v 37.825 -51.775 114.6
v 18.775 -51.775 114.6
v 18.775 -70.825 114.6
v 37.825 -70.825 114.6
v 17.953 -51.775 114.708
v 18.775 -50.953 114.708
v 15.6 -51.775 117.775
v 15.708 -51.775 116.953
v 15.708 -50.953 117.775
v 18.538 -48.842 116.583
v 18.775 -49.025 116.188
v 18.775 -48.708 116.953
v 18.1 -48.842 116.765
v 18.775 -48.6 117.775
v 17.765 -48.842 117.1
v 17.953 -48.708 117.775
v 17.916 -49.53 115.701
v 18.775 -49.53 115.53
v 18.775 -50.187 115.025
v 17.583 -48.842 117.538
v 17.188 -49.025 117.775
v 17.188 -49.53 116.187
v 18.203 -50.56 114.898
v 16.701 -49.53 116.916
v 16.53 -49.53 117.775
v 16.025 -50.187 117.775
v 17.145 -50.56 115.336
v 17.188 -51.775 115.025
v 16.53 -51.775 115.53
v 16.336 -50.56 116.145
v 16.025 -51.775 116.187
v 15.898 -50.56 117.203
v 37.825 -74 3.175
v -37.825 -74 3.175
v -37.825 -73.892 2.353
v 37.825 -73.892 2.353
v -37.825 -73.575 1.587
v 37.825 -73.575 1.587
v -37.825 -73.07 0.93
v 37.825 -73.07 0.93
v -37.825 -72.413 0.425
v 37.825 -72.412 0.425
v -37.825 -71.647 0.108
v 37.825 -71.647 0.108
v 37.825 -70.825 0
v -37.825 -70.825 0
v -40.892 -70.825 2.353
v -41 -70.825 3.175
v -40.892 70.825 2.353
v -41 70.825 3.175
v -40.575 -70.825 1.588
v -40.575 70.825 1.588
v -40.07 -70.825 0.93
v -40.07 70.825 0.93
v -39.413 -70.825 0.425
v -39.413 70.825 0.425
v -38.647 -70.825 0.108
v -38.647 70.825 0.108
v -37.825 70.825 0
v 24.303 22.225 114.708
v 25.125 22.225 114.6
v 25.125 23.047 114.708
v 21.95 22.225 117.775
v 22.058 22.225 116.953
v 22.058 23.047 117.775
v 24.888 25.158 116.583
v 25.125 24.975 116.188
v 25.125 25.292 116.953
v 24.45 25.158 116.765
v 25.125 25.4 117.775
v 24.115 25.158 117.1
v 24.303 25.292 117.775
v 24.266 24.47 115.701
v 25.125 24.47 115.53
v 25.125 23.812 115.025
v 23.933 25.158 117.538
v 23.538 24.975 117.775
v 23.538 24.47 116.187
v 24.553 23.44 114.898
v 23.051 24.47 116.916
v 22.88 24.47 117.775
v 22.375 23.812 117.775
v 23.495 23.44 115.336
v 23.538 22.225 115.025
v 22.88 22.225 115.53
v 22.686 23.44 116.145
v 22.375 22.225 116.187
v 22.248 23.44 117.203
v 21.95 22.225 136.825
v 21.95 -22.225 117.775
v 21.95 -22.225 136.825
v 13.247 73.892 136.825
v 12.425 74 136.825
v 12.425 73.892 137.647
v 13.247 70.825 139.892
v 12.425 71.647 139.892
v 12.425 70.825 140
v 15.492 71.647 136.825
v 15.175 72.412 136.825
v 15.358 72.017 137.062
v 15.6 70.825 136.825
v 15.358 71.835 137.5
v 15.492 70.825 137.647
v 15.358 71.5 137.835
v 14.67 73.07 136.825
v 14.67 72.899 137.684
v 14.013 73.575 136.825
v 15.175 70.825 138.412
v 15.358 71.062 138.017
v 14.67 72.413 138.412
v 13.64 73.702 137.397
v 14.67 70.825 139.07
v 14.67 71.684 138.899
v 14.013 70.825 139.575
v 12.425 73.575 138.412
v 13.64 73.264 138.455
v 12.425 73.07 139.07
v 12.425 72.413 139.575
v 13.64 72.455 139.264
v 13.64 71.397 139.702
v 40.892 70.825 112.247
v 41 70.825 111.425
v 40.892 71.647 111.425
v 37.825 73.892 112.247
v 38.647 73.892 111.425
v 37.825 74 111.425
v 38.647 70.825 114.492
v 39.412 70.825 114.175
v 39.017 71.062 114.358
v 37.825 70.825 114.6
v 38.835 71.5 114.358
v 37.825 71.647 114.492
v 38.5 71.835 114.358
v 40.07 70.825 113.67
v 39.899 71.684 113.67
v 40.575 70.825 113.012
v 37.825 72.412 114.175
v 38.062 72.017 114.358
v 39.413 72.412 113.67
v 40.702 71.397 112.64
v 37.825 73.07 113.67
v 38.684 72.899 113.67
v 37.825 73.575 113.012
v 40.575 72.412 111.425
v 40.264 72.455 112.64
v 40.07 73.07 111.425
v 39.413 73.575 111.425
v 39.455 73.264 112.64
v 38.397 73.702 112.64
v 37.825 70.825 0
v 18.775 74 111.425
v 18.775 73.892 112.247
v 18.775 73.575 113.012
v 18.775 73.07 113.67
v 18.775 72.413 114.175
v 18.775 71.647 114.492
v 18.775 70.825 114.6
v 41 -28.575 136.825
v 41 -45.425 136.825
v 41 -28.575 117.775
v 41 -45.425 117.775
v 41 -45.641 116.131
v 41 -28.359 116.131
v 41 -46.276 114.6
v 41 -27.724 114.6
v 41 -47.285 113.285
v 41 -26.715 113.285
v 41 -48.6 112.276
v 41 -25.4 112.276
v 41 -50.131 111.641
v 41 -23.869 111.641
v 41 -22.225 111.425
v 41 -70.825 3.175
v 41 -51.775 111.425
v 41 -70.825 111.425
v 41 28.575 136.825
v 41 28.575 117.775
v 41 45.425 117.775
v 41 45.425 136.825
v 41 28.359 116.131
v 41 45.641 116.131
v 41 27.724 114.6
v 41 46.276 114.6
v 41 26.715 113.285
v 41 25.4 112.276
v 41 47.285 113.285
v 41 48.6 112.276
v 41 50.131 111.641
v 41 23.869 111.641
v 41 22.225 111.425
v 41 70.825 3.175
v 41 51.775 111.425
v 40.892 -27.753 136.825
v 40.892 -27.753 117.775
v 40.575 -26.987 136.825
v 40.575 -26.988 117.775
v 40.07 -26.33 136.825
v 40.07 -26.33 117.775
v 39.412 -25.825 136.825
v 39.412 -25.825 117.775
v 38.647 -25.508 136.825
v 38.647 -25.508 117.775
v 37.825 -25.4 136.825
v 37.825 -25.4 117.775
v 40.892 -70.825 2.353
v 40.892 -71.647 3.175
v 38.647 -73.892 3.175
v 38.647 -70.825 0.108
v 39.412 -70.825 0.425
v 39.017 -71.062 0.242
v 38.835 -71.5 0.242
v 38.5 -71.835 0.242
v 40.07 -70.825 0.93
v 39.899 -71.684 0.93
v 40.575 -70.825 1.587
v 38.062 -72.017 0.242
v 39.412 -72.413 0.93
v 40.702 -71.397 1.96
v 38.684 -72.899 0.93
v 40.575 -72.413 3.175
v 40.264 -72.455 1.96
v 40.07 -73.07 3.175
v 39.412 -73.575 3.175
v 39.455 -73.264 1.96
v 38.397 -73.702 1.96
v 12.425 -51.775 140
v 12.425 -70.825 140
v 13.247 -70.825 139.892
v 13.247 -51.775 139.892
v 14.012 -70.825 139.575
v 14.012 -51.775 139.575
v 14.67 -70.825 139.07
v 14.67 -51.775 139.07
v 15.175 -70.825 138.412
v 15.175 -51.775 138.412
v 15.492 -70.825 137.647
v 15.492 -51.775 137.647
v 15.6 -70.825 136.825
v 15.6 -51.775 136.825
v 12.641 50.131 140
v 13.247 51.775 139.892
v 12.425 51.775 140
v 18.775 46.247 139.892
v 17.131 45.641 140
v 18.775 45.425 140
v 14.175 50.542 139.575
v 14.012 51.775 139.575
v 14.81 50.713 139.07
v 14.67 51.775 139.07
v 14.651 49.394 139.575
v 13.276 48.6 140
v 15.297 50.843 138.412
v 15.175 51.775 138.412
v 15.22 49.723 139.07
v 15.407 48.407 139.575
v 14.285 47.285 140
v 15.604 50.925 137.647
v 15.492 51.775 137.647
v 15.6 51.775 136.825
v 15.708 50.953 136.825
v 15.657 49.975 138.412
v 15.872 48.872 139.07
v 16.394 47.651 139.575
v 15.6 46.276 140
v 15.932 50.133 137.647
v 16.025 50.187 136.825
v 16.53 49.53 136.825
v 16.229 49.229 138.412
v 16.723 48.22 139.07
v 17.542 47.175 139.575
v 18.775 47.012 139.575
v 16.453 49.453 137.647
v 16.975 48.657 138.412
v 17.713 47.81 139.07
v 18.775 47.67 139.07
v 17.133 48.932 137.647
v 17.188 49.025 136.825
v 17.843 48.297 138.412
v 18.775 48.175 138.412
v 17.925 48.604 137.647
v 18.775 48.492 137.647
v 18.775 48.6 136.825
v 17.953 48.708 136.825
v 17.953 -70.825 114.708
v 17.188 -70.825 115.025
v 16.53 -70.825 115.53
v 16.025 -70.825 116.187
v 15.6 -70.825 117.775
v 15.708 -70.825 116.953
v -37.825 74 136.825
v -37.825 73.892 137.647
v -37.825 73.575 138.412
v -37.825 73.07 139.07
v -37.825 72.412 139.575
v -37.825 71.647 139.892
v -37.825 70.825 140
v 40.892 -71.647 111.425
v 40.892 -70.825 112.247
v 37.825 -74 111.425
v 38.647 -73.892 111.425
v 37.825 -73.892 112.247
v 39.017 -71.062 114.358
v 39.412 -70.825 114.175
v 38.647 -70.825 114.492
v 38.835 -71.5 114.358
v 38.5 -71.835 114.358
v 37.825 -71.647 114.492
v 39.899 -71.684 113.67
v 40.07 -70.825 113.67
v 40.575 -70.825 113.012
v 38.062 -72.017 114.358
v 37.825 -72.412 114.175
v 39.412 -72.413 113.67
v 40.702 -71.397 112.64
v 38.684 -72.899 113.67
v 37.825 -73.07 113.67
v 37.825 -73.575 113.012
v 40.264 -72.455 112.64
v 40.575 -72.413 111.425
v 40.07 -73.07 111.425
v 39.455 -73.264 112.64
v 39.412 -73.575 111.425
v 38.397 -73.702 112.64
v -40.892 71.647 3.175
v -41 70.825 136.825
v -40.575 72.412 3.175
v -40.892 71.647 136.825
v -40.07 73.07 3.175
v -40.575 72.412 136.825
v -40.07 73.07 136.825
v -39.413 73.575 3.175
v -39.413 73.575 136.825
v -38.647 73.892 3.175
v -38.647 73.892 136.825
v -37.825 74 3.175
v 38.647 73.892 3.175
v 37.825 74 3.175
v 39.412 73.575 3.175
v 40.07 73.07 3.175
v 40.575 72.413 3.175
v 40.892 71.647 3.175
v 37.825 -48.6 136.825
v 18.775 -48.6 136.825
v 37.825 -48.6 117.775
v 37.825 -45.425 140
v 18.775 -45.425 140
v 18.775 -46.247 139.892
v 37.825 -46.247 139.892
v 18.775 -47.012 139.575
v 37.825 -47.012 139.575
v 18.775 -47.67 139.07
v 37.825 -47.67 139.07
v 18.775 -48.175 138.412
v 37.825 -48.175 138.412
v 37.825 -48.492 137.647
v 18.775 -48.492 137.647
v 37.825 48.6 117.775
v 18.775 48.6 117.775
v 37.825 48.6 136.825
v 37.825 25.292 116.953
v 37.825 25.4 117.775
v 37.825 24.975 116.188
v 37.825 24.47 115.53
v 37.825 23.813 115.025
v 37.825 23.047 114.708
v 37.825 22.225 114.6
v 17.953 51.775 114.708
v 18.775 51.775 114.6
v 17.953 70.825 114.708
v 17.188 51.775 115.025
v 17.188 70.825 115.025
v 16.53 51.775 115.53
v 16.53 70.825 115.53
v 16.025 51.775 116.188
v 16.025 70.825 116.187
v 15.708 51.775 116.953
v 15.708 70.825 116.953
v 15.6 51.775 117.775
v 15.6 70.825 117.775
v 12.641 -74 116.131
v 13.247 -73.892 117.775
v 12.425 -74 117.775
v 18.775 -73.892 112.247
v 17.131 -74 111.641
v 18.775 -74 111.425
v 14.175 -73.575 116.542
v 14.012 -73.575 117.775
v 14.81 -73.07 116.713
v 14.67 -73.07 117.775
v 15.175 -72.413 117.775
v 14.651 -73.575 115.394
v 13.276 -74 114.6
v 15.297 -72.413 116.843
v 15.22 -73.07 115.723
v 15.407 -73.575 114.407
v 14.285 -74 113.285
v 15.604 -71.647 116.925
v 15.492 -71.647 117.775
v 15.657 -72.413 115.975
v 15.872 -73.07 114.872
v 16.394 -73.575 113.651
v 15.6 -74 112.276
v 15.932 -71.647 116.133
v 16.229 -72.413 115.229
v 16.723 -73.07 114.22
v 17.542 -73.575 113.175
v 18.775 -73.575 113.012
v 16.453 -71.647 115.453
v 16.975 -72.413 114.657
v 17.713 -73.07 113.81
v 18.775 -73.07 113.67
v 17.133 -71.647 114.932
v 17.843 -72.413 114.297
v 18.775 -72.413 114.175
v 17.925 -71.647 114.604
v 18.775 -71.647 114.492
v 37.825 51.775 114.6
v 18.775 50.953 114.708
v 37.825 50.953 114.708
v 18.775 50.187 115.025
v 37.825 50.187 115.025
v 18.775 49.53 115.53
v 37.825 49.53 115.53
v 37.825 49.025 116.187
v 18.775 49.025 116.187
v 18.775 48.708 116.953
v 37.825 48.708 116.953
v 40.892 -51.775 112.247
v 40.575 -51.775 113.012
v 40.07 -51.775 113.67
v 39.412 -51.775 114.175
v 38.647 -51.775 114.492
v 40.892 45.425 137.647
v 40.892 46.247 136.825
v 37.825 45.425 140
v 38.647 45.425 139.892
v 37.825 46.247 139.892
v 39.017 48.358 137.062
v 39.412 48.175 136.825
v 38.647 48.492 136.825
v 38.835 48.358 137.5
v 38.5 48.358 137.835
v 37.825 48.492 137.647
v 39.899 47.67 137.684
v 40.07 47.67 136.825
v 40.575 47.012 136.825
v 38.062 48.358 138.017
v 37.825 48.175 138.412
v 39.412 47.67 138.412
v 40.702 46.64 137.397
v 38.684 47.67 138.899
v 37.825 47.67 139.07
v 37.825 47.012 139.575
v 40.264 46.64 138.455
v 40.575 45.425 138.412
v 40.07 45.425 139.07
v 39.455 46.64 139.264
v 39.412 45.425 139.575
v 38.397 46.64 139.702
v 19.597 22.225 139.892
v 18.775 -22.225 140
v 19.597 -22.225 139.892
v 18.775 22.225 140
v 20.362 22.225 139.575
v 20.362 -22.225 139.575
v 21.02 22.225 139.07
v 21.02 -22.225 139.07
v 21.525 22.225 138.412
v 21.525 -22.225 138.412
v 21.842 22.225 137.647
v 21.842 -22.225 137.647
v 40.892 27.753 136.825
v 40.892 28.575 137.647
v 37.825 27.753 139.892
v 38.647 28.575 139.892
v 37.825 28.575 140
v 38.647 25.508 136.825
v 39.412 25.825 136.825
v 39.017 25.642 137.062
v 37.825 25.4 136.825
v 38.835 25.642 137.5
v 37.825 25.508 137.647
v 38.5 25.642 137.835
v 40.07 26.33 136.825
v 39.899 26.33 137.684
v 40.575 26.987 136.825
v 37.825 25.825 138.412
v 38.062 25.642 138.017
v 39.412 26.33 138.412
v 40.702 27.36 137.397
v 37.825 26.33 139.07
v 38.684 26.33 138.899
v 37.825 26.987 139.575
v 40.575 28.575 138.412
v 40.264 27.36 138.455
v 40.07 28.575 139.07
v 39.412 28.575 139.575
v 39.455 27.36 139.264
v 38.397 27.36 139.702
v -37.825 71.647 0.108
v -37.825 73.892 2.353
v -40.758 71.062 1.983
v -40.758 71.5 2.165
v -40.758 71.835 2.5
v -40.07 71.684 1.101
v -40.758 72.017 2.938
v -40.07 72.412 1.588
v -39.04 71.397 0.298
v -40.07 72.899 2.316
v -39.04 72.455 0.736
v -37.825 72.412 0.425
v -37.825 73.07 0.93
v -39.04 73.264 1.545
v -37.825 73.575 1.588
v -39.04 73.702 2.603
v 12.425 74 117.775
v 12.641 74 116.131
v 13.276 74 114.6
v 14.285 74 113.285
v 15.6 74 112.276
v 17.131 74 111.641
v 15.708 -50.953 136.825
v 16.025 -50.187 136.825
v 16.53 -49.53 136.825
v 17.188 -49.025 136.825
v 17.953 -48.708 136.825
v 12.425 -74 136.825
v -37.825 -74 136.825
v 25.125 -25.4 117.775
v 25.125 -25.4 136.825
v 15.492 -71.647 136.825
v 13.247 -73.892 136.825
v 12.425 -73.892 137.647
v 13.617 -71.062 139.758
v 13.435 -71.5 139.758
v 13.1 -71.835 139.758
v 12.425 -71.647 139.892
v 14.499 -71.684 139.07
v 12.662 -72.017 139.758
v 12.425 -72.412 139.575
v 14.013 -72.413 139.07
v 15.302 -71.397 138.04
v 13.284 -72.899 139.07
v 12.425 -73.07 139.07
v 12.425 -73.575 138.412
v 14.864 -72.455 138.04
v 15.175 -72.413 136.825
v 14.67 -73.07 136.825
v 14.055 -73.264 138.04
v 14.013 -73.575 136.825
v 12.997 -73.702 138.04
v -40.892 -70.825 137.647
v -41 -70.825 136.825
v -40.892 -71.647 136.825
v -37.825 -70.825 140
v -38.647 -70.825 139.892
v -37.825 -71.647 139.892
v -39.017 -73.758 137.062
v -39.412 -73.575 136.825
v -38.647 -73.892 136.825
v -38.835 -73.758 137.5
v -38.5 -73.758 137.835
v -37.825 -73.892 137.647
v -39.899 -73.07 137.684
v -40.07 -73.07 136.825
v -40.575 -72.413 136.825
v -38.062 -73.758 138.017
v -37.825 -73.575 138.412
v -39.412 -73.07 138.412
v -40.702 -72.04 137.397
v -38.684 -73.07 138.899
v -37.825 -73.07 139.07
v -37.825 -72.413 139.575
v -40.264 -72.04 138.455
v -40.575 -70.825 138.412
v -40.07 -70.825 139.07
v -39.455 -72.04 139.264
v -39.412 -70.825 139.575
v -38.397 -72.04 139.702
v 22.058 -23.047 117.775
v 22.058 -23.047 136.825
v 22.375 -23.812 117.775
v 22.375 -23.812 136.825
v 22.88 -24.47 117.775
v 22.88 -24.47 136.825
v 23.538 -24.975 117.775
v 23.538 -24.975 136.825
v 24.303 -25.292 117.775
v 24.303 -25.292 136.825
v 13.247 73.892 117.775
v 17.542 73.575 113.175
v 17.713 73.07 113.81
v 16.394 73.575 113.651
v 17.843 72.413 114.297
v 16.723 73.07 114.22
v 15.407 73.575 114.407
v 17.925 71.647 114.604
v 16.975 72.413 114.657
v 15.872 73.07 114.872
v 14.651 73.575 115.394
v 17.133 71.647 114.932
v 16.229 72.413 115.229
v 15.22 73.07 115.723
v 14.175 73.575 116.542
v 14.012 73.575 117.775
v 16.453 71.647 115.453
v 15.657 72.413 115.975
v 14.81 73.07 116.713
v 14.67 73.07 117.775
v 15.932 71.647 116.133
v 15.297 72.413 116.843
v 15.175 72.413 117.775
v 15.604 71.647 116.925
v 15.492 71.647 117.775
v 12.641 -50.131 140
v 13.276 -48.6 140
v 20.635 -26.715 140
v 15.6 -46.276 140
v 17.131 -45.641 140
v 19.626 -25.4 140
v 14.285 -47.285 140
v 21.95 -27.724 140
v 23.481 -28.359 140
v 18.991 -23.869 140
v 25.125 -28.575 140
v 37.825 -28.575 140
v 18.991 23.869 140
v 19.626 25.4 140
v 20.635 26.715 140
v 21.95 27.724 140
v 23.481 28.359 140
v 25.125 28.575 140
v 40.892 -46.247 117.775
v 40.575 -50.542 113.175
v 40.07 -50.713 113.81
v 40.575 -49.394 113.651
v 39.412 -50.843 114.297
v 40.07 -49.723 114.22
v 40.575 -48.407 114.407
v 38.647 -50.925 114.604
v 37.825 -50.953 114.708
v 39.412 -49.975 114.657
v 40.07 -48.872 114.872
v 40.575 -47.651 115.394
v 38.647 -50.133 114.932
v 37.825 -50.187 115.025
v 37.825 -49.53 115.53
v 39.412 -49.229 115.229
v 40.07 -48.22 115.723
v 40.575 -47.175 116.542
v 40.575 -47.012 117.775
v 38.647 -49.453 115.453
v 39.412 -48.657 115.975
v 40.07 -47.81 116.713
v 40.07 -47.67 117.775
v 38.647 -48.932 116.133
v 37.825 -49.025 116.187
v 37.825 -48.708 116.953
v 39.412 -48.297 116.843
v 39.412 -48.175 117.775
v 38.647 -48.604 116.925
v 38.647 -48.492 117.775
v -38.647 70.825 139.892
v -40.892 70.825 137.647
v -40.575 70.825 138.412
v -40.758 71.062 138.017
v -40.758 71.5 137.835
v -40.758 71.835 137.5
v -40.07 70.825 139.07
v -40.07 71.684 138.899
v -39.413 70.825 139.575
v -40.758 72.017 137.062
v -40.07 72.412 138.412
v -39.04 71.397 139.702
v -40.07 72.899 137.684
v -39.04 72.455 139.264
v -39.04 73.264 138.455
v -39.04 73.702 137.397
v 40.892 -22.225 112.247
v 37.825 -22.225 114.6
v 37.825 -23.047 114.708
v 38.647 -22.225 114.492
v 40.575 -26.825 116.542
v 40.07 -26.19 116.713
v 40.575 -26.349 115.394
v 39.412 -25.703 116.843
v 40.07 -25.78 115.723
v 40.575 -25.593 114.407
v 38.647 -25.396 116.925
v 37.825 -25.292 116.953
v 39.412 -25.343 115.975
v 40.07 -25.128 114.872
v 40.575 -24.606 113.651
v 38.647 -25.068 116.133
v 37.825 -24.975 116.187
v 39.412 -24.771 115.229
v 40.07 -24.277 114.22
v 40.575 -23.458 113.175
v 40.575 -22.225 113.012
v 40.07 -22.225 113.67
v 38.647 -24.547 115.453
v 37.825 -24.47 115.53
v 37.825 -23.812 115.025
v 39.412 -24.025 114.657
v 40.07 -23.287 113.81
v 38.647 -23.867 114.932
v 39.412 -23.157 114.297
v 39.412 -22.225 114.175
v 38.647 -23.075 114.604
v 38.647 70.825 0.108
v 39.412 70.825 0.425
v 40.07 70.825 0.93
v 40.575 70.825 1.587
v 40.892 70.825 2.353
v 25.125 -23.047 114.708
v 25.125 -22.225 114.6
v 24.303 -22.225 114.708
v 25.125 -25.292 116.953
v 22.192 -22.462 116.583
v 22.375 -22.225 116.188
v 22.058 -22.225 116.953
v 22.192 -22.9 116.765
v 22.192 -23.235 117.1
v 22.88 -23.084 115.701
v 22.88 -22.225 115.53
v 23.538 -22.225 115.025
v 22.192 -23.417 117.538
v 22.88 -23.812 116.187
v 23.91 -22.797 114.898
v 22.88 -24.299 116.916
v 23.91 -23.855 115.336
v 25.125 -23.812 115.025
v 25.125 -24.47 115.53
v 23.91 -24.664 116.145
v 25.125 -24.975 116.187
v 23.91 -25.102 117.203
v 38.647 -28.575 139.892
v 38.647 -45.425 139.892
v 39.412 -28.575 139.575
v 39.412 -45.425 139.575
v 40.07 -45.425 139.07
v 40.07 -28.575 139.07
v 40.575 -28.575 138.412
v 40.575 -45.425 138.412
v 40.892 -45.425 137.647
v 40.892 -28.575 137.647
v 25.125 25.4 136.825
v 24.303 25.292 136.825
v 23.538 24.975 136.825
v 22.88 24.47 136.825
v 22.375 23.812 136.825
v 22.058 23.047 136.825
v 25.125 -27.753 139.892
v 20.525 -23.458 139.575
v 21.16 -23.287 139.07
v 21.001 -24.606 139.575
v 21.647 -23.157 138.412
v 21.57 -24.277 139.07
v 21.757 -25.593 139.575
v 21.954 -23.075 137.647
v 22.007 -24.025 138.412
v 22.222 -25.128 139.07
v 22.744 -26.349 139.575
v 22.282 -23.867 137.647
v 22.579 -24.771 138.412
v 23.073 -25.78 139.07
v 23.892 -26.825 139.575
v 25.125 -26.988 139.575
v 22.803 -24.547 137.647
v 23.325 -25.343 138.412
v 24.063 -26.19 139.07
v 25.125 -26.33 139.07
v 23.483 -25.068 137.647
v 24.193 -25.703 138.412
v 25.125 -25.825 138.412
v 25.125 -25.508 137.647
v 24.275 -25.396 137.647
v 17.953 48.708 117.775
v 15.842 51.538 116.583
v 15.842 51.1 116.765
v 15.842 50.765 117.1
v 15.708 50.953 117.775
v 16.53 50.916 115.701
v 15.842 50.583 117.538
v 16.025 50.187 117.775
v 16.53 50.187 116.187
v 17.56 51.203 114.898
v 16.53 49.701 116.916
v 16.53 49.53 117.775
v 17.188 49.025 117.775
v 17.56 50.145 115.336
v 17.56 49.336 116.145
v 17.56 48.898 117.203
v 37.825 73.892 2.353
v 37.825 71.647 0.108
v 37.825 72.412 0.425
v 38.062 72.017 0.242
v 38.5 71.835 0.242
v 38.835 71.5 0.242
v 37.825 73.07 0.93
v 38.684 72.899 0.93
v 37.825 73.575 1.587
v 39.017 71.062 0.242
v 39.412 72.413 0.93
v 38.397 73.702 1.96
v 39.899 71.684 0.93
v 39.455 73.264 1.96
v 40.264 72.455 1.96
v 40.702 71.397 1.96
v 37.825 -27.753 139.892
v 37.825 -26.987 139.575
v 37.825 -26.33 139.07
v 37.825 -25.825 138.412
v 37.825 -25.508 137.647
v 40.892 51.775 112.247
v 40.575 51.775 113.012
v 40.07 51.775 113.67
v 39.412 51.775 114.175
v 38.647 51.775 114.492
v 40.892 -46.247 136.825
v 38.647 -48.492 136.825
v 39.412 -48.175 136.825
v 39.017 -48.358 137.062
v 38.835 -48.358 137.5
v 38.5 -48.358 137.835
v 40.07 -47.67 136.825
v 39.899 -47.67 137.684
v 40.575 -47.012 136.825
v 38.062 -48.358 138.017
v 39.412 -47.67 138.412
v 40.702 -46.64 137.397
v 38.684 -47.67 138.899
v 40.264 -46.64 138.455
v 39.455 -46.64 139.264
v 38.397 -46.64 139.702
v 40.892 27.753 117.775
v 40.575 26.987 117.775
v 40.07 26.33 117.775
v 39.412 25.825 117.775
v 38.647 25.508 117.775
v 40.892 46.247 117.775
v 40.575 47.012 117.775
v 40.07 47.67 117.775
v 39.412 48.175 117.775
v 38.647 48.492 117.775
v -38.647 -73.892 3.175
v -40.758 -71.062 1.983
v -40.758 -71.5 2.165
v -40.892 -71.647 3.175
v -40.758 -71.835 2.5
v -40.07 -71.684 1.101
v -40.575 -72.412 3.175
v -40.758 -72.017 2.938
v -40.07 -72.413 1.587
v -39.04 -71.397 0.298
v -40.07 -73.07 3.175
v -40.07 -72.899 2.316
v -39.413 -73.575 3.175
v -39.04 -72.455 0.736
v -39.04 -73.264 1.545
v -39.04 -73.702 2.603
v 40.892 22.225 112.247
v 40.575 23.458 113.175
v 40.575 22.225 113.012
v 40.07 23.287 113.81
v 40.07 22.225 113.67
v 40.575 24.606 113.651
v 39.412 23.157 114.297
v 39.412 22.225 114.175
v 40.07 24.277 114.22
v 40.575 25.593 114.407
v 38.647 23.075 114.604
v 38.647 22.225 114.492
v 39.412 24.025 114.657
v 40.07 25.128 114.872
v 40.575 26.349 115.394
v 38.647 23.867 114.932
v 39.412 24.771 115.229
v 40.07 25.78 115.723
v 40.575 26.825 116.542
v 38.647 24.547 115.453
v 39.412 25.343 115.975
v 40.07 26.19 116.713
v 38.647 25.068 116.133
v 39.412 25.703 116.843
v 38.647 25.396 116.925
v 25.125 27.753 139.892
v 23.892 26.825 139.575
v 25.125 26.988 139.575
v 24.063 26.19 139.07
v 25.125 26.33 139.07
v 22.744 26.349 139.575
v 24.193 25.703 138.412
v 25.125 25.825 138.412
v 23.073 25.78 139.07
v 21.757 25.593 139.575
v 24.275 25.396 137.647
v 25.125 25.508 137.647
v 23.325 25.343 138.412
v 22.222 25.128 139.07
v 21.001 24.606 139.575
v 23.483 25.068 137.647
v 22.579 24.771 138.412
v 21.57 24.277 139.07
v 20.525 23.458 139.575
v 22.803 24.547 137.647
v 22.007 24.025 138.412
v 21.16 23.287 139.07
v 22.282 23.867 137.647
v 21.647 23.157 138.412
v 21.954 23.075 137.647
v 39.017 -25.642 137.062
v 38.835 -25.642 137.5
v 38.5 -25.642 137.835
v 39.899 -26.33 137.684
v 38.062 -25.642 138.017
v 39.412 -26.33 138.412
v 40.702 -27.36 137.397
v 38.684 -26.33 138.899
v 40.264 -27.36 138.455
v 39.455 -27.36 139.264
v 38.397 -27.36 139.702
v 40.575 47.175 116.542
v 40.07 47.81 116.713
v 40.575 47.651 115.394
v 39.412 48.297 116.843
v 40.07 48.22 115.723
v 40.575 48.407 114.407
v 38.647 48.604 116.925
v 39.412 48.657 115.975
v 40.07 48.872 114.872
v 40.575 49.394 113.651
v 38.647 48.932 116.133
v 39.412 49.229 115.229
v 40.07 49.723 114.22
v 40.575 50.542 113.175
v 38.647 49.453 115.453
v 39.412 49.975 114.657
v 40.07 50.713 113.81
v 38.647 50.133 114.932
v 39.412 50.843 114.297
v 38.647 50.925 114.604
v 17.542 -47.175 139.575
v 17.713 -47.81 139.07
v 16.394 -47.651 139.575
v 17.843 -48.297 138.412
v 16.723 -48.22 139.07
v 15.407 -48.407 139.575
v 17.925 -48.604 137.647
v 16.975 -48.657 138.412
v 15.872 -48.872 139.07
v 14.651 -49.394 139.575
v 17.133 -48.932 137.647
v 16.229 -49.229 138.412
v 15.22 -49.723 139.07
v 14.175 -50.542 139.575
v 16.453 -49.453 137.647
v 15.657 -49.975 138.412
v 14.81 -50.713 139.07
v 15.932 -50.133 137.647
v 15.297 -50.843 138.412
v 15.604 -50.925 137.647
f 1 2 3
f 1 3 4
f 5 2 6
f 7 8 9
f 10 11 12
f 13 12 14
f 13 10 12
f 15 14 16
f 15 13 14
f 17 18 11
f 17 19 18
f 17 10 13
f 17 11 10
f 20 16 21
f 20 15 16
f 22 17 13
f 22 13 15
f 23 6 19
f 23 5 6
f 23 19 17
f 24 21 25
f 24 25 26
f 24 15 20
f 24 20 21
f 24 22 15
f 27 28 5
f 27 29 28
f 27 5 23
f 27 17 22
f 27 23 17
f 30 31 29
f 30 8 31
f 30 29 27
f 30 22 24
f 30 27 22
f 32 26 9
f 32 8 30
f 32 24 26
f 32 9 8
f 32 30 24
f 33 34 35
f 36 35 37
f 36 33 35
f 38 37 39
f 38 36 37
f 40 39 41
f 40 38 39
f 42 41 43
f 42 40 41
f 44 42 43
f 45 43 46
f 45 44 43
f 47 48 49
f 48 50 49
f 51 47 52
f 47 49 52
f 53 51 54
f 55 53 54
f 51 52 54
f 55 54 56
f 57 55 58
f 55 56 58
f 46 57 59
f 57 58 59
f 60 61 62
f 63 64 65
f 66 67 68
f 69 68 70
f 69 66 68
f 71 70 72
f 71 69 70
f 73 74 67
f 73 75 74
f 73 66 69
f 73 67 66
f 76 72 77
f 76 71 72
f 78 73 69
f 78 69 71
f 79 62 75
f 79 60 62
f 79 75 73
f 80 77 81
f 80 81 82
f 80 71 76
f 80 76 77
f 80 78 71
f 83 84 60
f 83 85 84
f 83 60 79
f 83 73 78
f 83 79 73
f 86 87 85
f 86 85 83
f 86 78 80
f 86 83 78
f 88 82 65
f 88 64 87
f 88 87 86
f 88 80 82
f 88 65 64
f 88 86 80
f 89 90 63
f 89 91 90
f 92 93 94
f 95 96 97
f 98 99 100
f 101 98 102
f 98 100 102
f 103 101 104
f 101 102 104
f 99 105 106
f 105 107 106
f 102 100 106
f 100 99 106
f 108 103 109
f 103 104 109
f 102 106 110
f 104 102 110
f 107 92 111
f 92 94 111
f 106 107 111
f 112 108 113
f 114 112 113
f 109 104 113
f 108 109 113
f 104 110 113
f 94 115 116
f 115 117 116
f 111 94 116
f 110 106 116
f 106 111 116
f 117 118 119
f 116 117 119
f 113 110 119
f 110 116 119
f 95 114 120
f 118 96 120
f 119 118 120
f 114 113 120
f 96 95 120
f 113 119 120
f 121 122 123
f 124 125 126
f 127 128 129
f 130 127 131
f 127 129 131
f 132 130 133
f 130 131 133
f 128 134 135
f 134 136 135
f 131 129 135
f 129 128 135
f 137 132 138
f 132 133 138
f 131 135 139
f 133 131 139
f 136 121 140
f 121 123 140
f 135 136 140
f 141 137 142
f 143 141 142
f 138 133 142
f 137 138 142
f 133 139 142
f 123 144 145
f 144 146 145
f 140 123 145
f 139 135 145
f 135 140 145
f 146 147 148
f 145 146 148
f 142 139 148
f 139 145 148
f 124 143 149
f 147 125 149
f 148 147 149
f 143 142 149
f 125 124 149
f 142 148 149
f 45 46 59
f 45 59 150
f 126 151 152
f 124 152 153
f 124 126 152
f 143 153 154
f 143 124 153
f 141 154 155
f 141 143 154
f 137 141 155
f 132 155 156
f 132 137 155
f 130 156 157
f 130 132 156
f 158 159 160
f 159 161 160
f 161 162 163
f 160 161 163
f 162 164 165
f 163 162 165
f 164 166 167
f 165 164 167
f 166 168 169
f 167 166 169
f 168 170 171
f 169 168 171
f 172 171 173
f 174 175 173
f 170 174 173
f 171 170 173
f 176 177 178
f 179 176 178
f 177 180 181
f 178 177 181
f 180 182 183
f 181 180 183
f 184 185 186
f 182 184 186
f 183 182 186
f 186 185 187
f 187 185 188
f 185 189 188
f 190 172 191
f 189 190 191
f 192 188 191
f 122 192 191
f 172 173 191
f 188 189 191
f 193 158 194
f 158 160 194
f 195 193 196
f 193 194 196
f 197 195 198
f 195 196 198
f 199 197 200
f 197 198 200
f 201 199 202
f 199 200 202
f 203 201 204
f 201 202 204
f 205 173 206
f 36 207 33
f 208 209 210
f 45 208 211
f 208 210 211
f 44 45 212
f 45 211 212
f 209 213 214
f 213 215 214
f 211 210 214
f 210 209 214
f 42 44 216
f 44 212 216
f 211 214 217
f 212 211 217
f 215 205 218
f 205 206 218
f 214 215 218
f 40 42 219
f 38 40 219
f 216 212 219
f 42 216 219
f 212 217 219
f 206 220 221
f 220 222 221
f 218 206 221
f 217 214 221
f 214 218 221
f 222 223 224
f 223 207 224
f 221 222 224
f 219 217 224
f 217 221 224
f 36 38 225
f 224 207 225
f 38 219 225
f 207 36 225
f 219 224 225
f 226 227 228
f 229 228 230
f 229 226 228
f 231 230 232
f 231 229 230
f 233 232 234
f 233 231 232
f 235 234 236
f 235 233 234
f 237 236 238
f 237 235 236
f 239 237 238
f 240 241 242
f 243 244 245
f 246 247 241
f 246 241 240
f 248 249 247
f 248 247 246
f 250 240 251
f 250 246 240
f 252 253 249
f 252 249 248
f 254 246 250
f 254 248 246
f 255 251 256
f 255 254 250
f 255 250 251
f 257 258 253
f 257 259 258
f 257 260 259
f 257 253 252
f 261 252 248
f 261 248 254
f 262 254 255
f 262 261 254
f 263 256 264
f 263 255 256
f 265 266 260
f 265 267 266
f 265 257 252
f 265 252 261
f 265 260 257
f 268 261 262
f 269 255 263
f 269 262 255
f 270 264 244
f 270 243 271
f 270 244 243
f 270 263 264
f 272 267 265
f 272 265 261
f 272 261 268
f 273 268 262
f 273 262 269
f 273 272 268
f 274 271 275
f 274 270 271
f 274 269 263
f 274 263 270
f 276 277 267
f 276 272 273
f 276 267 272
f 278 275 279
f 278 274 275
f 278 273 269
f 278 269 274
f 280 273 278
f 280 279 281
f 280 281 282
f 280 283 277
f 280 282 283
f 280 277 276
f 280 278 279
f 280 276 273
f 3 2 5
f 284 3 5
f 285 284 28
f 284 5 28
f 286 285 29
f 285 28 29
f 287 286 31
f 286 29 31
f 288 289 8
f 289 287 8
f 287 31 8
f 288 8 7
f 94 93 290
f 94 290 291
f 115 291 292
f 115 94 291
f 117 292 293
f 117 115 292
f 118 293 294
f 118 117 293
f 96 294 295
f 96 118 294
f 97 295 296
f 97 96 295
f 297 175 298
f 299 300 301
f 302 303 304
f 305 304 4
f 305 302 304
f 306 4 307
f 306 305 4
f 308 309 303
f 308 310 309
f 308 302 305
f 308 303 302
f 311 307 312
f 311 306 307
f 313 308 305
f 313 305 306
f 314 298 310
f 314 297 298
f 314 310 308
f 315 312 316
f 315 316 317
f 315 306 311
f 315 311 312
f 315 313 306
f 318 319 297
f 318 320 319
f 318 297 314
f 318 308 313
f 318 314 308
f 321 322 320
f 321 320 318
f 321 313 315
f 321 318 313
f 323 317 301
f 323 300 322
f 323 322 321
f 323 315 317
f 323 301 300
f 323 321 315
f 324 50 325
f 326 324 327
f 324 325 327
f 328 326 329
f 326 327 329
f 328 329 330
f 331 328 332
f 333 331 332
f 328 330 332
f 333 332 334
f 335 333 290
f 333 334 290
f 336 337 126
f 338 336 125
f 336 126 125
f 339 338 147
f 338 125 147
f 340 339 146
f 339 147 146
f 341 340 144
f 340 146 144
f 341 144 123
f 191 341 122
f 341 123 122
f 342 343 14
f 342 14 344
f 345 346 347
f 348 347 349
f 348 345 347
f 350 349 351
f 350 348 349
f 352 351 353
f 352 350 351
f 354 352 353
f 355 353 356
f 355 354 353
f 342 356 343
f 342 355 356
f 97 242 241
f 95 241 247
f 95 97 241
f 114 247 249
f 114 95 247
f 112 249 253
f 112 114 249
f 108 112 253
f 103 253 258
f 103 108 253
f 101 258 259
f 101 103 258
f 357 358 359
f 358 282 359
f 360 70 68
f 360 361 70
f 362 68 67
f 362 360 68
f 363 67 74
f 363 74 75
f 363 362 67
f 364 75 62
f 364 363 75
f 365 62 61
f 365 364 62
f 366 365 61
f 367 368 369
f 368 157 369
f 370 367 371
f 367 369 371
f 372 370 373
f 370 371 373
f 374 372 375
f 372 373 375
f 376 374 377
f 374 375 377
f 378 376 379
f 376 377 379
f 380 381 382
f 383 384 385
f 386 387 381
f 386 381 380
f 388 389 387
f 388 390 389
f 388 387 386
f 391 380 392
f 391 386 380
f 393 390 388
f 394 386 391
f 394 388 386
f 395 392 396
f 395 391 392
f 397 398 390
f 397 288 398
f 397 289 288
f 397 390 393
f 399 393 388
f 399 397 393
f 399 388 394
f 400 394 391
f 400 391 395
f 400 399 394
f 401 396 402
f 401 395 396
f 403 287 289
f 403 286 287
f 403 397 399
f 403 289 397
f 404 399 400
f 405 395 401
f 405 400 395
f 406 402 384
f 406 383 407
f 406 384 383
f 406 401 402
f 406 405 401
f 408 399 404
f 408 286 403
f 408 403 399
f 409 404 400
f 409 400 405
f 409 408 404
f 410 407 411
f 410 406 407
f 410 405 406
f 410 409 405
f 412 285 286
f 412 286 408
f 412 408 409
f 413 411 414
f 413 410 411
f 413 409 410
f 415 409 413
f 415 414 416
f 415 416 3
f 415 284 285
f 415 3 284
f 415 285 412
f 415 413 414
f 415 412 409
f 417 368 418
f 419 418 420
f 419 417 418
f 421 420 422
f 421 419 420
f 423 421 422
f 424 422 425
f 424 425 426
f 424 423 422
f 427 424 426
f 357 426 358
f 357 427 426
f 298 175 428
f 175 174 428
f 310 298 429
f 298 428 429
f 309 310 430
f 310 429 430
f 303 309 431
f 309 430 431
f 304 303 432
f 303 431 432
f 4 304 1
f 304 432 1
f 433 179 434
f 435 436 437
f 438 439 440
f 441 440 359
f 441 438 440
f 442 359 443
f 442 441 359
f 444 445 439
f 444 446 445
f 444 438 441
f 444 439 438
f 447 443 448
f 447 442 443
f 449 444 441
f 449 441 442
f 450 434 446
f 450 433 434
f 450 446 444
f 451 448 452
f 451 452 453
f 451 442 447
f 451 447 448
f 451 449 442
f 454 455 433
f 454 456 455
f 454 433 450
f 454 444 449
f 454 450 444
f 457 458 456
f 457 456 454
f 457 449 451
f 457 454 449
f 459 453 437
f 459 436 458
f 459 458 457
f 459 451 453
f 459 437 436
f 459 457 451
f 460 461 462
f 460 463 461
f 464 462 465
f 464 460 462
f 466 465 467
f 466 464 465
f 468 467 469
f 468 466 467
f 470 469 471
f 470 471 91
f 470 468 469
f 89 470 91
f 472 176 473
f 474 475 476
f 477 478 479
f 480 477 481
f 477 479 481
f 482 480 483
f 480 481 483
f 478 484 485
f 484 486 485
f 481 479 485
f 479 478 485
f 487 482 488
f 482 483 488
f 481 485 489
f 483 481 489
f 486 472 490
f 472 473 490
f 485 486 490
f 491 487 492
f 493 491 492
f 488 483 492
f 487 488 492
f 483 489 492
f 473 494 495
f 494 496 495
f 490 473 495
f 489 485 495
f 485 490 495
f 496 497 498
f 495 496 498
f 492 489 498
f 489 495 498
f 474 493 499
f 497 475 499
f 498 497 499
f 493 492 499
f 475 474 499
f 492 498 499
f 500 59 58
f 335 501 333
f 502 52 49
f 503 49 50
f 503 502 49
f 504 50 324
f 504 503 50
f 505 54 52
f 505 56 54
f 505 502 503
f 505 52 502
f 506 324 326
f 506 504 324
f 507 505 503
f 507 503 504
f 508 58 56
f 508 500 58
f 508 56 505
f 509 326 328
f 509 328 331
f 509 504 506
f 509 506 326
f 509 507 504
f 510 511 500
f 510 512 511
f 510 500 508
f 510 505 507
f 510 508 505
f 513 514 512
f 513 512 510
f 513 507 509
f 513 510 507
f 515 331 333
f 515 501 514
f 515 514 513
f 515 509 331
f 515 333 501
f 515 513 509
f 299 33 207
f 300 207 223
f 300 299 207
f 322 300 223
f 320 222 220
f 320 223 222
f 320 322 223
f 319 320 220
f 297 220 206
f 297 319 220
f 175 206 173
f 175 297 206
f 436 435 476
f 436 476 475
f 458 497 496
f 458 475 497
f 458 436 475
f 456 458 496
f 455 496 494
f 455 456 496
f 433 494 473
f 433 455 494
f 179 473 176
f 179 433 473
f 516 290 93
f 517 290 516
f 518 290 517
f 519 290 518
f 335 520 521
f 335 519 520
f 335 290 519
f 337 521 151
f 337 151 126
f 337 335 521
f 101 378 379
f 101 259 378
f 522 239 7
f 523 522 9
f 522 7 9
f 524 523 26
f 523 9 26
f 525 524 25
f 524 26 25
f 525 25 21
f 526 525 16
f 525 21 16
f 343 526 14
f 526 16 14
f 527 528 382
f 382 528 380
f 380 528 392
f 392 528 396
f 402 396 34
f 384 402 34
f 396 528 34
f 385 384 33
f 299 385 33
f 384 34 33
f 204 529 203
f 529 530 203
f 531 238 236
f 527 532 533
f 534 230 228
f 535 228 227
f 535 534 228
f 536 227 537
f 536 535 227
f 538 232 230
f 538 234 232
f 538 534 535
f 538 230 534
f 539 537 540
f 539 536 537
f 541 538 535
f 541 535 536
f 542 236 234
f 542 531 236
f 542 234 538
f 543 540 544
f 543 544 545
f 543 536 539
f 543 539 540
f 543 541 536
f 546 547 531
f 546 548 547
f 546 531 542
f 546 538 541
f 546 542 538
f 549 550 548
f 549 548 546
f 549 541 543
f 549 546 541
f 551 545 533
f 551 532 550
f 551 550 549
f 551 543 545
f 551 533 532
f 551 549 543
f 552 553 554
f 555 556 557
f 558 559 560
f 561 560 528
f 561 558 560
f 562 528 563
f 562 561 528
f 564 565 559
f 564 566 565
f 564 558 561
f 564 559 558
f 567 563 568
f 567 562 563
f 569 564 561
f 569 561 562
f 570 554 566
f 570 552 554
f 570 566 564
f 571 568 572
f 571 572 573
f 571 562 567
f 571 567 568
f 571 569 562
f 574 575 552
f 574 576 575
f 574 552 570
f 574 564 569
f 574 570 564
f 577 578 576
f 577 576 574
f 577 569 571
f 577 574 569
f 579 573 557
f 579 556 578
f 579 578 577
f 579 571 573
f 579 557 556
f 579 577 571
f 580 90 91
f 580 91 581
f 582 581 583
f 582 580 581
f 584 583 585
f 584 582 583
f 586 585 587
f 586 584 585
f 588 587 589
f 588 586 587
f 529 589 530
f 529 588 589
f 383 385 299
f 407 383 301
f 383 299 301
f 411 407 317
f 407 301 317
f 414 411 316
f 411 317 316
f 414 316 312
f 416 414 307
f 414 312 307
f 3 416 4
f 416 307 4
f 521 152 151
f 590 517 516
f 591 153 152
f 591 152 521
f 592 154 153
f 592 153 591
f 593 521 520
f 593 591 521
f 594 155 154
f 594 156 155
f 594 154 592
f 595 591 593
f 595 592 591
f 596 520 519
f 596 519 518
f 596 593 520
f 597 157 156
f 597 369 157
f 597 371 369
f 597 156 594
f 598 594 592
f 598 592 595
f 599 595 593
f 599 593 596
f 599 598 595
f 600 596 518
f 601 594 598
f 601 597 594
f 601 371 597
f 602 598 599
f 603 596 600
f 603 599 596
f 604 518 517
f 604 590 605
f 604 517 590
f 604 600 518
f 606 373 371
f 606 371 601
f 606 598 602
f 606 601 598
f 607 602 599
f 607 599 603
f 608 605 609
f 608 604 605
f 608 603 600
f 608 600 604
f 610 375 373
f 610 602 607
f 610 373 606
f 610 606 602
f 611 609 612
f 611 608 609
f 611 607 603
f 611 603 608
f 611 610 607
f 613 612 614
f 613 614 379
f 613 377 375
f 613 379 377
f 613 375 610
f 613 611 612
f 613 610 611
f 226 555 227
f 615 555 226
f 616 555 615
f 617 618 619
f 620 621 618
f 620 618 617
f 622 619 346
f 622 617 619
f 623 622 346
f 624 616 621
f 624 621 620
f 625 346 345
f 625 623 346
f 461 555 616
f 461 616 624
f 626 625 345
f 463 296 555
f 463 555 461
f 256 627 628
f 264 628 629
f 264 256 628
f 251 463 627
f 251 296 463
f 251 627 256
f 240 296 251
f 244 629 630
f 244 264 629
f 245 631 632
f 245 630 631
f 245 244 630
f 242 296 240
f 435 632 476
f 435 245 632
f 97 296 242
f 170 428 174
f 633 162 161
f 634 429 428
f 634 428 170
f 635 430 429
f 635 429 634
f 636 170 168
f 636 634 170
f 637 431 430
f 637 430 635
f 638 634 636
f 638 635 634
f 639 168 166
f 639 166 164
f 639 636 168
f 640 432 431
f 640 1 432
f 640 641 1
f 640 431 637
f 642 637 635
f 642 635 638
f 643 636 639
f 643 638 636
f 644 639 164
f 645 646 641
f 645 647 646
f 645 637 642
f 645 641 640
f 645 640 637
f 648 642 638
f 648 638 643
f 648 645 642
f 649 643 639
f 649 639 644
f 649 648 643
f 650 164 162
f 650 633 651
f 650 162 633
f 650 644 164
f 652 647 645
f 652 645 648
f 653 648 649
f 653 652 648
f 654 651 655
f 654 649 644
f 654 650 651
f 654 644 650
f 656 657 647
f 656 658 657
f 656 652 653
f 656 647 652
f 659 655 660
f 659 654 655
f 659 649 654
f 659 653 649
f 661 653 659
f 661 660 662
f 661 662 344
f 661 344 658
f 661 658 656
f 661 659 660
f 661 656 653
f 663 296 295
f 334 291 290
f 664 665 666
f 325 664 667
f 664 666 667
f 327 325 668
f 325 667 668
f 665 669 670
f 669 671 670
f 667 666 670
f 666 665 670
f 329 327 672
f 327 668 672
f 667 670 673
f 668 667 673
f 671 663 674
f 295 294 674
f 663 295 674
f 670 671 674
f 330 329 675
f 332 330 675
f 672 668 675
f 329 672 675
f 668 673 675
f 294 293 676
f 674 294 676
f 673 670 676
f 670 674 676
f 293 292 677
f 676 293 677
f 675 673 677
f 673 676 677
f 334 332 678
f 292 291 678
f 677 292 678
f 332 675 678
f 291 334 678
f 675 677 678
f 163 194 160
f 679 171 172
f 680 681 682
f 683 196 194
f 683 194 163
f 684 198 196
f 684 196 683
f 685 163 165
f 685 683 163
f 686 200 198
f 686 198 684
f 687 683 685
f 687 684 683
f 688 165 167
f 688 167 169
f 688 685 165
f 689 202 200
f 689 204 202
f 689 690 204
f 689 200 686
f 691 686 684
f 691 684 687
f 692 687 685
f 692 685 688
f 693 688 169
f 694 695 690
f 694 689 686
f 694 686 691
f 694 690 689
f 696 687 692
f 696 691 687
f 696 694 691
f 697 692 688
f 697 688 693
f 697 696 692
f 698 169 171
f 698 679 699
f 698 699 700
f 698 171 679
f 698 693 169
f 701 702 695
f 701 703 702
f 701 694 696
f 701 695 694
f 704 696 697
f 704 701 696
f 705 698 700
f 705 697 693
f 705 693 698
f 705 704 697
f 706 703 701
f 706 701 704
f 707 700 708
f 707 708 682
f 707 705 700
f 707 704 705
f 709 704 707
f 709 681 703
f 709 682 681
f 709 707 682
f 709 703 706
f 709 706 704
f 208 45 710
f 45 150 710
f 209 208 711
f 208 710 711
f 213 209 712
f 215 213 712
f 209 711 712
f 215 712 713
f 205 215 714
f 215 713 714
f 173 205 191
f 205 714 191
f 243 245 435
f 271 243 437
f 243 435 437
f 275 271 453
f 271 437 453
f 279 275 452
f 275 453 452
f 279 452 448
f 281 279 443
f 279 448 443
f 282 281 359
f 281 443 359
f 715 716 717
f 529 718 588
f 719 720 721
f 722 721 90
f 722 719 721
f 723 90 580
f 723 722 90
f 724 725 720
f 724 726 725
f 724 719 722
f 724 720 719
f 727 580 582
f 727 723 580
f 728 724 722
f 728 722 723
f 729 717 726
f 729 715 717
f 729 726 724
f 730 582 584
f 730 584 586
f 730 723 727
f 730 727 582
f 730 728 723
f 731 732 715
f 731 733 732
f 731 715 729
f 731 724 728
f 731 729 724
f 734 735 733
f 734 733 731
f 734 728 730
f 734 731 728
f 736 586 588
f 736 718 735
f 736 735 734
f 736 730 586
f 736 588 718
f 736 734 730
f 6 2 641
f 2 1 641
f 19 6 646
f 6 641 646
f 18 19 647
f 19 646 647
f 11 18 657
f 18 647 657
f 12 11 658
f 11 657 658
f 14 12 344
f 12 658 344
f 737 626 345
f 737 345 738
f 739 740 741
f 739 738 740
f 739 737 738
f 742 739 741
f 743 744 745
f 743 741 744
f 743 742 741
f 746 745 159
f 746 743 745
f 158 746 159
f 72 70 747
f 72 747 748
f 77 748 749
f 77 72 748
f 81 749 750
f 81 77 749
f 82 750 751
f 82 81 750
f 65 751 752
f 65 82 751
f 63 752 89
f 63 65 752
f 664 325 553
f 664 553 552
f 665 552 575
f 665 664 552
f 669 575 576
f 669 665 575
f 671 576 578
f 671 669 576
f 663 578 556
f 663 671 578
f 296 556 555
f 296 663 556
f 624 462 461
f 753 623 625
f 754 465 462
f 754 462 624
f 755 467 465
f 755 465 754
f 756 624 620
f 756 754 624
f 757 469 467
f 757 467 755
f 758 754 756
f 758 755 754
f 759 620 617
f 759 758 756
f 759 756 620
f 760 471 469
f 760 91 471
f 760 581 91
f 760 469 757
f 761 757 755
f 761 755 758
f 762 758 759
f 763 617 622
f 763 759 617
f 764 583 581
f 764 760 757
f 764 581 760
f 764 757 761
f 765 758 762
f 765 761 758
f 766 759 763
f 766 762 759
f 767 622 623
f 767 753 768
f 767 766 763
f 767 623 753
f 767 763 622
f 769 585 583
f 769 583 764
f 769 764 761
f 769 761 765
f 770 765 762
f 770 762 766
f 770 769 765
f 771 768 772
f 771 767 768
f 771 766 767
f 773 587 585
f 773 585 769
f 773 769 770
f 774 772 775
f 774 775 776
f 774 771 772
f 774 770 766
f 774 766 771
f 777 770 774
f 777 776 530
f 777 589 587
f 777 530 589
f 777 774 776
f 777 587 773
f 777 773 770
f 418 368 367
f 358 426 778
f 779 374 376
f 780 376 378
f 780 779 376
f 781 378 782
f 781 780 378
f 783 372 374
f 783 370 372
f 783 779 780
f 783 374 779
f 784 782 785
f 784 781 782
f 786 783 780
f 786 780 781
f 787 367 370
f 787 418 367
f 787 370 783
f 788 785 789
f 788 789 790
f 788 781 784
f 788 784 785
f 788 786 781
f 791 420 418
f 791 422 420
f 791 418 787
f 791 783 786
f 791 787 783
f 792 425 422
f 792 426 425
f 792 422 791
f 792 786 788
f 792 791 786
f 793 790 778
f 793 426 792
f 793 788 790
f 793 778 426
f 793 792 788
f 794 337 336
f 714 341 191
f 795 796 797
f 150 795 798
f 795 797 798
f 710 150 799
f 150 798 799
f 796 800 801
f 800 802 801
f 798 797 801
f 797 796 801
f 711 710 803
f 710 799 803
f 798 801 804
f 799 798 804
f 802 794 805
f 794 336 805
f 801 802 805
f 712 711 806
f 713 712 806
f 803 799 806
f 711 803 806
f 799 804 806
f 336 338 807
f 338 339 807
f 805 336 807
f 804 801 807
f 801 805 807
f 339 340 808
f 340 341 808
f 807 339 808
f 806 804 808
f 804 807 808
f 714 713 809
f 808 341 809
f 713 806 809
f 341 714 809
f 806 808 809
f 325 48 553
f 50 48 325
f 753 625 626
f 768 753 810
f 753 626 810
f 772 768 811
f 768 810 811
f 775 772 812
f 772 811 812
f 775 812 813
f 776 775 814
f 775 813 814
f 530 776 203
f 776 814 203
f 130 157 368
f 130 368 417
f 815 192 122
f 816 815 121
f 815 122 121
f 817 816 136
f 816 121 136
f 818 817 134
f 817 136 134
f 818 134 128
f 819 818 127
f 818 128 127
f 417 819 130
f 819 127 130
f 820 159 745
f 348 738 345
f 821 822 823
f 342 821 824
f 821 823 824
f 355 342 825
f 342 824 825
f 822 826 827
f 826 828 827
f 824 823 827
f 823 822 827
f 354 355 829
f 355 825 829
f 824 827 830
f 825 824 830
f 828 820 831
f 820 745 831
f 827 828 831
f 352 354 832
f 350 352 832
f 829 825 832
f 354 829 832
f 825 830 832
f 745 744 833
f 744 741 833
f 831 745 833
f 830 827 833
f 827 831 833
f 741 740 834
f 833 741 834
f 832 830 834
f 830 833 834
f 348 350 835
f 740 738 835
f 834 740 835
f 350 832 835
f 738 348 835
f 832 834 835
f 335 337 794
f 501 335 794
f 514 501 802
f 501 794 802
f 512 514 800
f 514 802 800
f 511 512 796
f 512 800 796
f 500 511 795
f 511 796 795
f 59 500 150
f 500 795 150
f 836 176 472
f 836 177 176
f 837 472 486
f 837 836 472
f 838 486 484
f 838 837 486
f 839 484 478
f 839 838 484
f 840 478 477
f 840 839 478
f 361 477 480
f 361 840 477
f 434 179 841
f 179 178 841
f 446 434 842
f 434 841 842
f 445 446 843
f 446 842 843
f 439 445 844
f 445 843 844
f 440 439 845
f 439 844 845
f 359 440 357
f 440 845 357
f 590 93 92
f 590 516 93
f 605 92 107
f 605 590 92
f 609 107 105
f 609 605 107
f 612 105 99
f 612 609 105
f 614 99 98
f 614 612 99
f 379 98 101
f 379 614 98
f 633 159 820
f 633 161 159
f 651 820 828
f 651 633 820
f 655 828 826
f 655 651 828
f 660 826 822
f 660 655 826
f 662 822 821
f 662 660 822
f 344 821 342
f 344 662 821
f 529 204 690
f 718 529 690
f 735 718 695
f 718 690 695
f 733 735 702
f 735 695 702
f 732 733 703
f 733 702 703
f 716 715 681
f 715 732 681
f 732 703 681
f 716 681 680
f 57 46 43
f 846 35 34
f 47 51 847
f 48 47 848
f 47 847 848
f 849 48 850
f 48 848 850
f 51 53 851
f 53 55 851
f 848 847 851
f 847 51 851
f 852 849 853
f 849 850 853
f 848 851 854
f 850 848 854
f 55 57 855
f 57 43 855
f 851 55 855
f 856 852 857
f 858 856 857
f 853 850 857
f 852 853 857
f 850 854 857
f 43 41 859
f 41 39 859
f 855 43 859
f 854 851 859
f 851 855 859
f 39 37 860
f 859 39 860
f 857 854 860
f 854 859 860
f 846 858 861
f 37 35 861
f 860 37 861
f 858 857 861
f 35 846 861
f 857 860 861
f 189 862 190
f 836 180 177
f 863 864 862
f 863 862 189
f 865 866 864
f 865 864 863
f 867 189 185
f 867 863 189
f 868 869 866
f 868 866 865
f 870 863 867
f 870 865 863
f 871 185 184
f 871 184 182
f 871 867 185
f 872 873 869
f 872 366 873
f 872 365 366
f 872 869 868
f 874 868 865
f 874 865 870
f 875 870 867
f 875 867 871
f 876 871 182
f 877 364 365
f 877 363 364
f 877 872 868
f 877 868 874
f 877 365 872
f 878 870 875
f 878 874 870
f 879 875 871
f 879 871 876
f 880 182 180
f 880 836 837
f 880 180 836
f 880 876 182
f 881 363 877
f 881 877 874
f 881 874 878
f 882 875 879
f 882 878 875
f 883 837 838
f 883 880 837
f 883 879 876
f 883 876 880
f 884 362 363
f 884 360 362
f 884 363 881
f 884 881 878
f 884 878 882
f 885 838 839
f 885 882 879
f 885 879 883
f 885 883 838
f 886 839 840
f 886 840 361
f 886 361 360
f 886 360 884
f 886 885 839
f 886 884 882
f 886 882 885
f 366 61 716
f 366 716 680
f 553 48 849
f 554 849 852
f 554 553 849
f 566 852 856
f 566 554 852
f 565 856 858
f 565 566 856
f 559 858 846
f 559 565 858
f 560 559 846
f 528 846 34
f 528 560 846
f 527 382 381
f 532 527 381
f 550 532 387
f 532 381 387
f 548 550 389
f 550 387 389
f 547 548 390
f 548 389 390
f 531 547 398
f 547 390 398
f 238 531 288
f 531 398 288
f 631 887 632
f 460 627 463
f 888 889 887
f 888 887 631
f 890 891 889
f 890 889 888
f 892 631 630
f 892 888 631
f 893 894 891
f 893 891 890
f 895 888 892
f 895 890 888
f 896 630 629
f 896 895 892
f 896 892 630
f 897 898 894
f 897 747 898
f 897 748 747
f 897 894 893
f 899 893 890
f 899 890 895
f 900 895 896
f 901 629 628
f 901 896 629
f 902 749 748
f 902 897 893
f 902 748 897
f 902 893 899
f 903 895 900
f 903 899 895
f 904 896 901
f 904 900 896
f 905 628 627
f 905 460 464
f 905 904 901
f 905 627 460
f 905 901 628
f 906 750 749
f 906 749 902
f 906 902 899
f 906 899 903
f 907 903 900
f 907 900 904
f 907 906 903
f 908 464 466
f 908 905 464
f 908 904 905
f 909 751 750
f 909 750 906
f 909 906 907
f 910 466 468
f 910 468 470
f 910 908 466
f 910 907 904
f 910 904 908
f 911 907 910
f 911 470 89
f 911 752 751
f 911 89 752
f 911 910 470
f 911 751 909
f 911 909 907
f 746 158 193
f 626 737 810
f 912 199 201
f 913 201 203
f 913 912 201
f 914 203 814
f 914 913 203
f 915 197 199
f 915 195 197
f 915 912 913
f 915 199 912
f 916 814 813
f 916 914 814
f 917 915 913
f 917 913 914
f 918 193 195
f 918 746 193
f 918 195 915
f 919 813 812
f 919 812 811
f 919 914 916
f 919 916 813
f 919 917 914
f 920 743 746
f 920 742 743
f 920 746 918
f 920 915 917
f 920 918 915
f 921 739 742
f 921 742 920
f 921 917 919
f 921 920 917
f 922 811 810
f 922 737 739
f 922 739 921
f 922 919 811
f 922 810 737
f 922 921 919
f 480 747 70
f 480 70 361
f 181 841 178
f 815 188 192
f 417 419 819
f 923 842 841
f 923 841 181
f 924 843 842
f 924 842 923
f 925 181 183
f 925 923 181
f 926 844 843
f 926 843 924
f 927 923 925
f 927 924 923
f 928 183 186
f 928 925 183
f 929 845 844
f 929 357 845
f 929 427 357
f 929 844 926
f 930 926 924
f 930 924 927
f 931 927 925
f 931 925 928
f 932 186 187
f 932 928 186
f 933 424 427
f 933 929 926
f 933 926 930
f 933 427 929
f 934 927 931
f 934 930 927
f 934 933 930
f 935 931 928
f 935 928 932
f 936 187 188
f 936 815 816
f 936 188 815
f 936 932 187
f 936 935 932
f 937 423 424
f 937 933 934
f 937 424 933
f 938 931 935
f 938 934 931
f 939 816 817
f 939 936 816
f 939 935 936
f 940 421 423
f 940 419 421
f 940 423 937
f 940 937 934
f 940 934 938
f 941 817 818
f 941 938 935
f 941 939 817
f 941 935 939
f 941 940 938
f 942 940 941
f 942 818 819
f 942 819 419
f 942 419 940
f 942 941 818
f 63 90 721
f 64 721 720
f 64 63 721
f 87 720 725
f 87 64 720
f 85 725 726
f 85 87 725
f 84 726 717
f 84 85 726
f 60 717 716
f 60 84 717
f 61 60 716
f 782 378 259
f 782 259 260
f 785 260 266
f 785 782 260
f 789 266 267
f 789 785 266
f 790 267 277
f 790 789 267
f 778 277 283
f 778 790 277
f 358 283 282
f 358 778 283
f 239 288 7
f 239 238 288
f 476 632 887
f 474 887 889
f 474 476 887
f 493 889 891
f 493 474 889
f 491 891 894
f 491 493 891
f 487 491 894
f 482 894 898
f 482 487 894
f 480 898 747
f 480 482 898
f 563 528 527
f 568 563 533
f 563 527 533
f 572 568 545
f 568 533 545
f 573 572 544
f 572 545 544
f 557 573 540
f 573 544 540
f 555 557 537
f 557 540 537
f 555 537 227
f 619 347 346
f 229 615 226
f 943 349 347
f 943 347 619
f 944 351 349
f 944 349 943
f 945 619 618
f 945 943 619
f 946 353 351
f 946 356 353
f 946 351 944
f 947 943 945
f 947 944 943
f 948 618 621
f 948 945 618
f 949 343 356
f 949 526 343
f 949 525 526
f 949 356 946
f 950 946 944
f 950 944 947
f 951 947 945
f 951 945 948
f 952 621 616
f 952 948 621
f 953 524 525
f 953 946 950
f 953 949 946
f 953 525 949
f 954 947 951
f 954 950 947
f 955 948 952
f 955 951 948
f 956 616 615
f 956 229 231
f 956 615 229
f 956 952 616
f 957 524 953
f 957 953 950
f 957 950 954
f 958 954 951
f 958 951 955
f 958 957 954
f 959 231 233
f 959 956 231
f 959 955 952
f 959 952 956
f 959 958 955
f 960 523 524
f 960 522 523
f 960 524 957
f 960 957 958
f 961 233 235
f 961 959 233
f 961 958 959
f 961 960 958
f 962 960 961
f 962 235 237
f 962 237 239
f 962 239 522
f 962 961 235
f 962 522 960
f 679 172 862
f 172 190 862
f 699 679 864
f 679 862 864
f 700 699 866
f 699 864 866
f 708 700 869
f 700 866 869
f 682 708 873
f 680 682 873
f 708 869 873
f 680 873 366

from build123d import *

# Parameters (mm, degrees)
SKETCH1_W           = 82
SKETCH1_H           = 148
BOSS_EXTRUDE1_DEPTH = 140
SKETCH2_W           = 25.4
SKETCH2_H           = 25.4
SKETCH2_W_2         = 19.05
SKETCH2_H_2         = 50.8
CUT_EXTRUDE1_DEPTH  = 25.4
FILLET1_R           = 3.175


with BuildPart() as part:
    # Sketch1 → Boss-Extrude1 (new body)
    with BuildSketch(Plane.XY):
        Rectangle(SKETCH1_W, SKETCH1_H)
    extrude(amount=BOSS_EXTRUDE1_DEPTH)

    # Sketch2 → Cut-Extrude1 (cut)
    with BuildSketch(Plane.XY.offset(140)):
        with Locations((28.3, -61.3)):
            Rectangle(SKETCH2_W, SKETCH2_H)
        with Locations((28.3, 61.3)):
            Rectangle(SKETCH2_W, SKETCH2_H)
        with Locations((31.475, 0)):
            Rectangle(SKETCH2_W_2, SKETCH2_H_2)
    extrude(amount=-CUT_EXTRUDE1_DEPTH, mode=Mode.SUBTRACT)

    # Fillet1
    fillet1_edges = [part.edges().sort_by_distance(p)[0] for p in [
        (41, -37, 140),
        (41, 37, 140),
        (-12.7, 74, 140),
        (41, 74, 57.3),
        (41, -74, 57.3),
        (41, -61.3, 114.6),
        (41, -48.6, 127.3),
        (28.3, -74, 114.6),
        (15.6, -61.3, 114.6),
        (15.6, -74, 127.3),
        (28.3, -48.6, 114.6),
        (15.6, -48.6, 127.3),
        (28.3, -48.6, 140),
        (15.6, -61.3, 140),
        (41, 61.3, 114.6),
        (28.3, 48.6, 114.6),
        (41, 48.6, 127.3),
        (15.6, 61.3, 114.6),
        (15.6, 48.6, 127.3),
        (28.3, 74, 114.6),
        (15.6, 74, 127.3),
        (15.6, 61.3, 140),
        (28.3, 48.6, 140),
        (41, 0, 114.6),
        (41, 25.4, 127.3),
        (31.475, -25.4, 114.6),
        (41, -25.4, 127.3),
        (21.95, 0, 114.6),
        (21.95, -25.4, 127.3),
        (31.475, 25.4, 114.6),
        (21.95, 25.4, 127.3),
        (31.475, 25.4, 140),
        (21.95, 0, 140),
        (31.475, -25.4, 140),
        (-41, 0, 140),
        (0, 74, 0),
        (41, 0, 0),
        (0, -74, 0),
        (-41, 0, 0),
        (-41, 74, 70),
        (-41, -74, 70),
        (-12.7, -74, 140),
    ]]
    fillet(fillet1_edges, radius=FILLET1_R)


solid = part.part
